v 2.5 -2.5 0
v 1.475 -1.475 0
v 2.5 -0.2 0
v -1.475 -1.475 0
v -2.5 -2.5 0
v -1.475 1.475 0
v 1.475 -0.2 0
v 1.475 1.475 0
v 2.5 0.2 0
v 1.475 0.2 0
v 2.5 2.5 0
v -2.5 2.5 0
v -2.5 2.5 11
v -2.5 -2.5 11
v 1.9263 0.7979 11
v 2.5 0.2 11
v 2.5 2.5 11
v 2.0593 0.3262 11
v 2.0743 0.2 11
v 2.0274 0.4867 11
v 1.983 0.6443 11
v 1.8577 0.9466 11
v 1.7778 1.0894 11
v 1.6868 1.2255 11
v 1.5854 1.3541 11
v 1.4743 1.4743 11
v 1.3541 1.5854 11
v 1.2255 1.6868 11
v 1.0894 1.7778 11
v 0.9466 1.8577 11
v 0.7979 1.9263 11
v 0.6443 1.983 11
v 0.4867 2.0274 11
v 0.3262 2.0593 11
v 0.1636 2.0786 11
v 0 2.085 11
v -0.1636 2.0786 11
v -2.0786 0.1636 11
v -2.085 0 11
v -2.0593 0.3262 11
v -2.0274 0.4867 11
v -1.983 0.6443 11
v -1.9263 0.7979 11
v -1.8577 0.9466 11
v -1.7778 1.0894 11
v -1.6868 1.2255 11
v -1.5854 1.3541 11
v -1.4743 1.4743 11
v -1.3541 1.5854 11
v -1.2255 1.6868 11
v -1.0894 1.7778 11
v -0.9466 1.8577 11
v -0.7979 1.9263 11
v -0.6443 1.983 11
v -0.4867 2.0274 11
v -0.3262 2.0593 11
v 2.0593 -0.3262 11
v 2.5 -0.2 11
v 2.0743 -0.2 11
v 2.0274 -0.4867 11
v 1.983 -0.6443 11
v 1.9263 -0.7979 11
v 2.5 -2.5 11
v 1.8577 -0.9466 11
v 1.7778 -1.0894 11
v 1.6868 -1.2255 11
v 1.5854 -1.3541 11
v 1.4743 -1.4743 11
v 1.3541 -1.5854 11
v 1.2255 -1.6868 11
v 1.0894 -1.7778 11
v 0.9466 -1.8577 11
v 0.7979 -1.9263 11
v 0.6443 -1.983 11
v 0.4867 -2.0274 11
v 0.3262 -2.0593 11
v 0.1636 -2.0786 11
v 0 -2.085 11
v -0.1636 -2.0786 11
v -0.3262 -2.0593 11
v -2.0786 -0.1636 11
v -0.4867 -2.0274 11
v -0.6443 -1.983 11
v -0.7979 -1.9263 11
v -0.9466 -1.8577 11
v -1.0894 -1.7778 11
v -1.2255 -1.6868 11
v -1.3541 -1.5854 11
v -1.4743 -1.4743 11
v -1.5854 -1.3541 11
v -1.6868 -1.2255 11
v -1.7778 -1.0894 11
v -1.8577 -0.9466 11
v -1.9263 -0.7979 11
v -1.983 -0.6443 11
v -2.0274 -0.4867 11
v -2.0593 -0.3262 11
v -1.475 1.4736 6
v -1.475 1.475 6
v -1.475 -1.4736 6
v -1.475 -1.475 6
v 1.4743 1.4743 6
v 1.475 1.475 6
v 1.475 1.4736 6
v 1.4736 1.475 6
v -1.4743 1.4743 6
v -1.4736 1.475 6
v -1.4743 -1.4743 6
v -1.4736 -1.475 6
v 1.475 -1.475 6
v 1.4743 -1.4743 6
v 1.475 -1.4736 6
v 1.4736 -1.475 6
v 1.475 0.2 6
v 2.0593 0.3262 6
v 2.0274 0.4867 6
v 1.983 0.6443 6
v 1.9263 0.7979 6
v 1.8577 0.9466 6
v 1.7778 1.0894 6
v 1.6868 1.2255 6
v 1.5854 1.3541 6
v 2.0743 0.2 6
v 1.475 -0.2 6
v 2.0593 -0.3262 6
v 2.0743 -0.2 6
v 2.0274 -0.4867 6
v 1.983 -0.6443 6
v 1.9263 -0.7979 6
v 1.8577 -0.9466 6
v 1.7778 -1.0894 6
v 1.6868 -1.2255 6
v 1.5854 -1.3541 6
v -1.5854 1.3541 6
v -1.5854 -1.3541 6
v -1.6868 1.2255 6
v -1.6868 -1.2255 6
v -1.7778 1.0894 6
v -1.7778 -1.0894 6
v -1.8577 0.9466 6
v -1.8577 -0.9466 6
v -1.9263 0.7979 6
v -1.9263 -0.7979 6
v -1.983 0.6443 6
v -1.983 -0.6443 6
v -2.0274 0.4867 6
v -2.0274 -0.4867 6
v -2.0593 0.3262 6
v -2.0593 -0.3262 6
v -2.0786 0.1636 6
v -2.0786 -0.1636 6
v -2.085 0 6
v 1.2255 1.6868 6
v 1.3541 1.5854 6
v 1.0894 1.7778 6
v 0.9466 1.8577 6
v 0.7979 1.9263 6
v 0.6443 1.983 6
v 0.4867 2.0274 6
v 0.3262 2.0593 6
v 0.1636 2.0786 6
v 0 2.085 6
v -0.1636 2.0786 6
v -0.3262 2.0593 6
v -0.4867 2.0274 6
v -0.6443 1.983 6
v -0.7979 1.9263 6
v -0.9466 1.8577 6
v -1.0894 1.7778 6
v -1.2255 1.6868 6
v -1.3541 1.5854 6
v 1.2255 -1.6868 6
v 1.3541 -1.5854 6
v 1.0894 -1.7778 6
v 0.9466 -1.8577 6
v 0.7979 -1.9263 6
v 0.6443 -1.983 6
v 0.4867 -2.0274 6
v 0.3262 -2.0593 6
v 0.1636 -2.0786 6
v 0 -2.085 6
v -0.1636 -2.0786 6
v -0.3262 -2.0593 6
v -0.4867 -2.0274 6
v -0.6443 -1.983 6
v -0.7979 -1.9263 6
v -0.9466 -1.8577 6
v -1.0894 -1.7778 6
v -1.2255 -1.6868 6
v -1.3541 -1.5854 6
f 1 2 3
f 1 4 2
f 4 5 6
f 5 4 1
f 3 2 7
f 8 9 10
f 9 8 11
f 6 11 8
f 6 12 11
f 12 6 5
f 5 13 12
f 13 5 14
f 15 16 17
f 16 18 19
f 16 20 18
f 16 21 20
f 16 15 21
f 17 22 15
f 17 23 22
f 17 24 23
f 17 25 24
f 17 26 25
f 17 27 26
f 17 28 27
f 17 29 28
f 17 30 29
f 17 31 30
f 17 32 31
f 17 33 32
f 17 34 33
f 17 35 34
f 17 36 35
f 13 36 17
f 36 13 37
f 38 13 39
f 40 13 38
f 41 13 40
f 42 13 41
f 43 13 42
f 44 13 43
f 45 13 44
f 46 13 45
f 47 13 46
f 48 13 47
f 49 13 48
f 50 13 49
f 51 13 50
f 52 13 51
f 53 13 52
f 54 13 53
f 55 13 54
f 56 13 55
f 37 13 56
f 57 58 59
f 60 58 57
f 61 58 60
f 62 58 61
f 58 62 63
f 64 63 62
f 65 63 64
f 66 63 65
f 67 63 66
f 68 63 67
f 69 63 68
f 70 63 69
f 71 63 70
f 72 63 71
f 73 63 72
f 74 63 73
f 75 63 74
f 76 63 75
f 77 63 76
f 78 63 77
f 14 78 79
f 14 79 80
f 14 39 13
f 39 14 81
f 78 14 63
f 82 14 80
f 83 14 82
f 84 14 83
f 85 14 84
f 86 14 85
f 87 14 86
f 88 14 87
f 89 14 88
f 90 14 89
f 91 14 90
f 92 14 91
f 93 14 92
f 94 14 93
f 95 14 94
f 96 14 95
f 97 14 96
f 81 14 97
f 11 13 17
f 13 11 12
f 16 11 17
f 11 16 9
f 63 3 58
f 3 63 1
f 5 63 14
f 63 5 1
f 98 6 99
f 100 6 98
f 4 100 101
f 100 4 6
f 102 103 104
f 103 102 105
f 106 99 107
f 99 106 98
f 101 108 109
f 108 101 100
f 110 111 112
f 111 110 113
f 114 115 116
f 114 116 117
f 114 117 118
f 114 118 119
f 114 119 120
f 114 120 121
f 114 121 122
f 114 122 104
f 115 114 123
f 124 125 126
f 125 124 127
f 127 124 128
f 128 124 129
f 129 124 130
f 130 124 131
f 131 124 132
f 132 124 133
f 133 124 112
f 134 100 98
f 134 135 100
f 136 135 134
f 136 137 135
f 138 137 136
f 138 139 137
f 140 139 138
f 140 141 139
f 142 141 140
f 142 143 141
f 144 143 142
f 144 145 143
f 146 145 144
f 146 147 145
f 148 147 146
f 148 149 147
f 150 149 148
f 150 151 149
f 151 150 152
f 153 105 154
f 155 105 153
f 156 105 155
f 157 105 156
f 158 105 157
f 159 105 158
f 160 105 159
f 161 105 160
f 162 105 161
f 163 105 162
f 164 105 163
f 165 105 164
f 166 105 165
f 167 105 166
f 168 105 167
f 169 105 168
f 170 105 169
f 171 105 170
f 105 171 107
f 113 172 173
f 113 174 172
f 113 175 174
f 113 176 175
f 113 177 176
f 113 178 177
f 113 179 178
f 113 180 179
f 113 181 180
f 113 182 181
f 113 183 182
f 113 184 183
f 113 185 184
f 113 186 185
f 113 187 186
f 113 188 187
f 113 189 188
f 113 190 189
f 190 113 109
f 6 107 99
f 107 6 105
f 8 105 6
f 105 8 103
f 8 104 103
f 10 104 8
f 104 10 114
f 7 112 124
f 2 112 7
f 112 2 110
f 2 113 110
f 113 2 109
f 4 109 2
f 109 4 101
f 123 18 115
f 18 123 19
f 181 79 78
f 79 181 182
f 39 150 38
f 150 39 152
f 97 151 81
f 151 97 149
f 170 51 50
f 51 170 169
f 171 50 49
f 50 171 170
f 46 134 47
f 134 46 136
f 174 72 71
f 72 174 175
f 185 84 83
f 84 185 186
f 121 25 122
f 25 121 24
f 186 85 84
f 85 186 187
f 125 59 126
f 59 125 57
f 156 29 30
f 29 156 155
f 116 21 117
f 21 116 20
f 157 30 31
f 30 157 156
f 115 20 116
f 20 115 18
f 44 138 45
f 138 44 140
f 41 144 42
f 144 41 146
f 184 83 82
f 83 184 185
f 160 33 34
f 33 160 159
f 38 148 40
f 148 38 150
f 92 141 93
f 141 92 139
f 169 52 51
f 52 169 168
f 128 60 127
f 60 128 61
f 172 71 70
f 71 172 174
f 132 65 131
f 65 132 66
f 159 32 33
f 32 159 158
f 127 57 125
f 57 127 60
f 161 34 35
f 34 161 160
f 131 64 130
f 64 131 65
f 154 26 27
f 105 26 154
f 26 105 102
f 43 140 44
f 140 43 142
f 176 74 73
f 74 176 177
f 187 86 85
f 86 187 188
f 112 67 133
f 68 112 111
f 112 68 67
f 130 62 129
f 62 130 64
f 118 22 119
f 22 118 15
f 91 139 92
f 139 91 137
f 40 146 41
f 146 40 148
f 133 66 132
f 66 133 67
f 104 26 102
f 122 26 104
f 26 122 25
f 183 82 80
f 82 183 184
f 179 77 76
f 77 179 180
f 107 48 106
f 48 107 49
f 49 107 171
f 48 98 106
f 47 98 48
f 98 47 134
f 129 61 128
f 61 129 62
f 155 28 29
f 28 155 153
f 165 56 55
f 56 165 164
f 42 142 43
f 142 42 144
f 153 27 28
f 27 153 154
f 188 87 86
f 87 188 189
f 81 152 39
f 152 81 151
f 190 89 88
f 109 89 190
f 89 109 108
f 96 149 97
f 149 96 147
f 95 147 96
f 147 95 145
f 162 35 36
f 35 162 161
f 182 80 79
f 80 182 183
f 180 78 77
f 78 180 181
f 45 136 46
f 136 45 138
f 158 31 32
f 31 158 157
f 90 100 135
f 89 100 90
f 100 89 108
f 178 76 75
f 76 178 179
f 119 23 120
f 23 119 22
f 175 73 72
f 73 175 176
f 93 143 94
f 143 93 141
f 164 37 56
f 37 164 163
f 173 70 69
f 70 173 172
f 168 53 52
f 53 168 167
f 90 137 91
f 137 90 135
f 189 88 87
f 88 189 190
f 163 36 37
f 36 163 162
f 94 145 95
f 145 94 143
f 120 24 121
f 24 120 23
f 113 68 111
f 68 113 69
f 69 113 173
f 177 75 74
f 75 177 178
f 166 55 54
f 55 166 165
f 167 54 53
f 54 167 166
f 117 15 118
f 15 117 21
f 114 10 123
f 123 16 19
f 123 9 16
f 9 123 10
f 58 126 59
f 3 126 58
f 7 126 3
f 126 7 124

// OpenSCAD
/////////////////////////////////////////////////////////////////////////////////
// Tap adapter M3/M4                                                           //
//                                                                             //
// Fits M3/M4 undersized tap in M5-M12 Ratchet tap wrench   KWB 443820         //
//                                                                             //    
// auth: Ousiris                                                               //
// date: 10jun20                                                               //
// version: V1                                                                 //
//                                                                             //
/////////////////////////////////////////////////////////////////////////////////

$fn=80;

module M3(){// KWB 443003 M3 HSS DIN352 M3 machine tap 
bh=6;       // bottom height
bs=2.65;    // bottom square rib
ch=5;       // cylindrical height
cd=3.42;    // cylindrical diameter
ocd=5;      // outer cylinder diameter
sw=0.4;     // compression slit width
tol=0.3;    // tolerance
build(bh,bs,ch,cd,ocd,sw,tol);    
};//</M3>

module M4(){//KWB 443004 M4 HSS DIN352 M4 machine tap                            
bh=7;       // bottom height
bs=3.3;     // bottom square rib
ch=6;       // cylindrical height
cd=4.45;    // cylindrical diameter
ocd=6;      // outer cylinder diameter
sw=0.4;     // compression slit width
tol=0.35;   // tolerance
build(bh,bs,ch,cd,ocd,sw,tol);    
};//</M4>



module build(bh,bs,ch,cd,ocd,sw,tol){
difference(){
    linear_extrude(bh+ch)square(ocd,center=true);
    linear_extrude(bh)square(bs+tol,center=true );
    translate([0,0,bh])linear_extrude(ch)circle(d=(cd+2.5*tol));
    linear_extrude(20)translate([0,-sw/2])square([10,sw],center=false);
    }
};//</build>

// Uncomment to enable desired tap size
M3();
//M4();
